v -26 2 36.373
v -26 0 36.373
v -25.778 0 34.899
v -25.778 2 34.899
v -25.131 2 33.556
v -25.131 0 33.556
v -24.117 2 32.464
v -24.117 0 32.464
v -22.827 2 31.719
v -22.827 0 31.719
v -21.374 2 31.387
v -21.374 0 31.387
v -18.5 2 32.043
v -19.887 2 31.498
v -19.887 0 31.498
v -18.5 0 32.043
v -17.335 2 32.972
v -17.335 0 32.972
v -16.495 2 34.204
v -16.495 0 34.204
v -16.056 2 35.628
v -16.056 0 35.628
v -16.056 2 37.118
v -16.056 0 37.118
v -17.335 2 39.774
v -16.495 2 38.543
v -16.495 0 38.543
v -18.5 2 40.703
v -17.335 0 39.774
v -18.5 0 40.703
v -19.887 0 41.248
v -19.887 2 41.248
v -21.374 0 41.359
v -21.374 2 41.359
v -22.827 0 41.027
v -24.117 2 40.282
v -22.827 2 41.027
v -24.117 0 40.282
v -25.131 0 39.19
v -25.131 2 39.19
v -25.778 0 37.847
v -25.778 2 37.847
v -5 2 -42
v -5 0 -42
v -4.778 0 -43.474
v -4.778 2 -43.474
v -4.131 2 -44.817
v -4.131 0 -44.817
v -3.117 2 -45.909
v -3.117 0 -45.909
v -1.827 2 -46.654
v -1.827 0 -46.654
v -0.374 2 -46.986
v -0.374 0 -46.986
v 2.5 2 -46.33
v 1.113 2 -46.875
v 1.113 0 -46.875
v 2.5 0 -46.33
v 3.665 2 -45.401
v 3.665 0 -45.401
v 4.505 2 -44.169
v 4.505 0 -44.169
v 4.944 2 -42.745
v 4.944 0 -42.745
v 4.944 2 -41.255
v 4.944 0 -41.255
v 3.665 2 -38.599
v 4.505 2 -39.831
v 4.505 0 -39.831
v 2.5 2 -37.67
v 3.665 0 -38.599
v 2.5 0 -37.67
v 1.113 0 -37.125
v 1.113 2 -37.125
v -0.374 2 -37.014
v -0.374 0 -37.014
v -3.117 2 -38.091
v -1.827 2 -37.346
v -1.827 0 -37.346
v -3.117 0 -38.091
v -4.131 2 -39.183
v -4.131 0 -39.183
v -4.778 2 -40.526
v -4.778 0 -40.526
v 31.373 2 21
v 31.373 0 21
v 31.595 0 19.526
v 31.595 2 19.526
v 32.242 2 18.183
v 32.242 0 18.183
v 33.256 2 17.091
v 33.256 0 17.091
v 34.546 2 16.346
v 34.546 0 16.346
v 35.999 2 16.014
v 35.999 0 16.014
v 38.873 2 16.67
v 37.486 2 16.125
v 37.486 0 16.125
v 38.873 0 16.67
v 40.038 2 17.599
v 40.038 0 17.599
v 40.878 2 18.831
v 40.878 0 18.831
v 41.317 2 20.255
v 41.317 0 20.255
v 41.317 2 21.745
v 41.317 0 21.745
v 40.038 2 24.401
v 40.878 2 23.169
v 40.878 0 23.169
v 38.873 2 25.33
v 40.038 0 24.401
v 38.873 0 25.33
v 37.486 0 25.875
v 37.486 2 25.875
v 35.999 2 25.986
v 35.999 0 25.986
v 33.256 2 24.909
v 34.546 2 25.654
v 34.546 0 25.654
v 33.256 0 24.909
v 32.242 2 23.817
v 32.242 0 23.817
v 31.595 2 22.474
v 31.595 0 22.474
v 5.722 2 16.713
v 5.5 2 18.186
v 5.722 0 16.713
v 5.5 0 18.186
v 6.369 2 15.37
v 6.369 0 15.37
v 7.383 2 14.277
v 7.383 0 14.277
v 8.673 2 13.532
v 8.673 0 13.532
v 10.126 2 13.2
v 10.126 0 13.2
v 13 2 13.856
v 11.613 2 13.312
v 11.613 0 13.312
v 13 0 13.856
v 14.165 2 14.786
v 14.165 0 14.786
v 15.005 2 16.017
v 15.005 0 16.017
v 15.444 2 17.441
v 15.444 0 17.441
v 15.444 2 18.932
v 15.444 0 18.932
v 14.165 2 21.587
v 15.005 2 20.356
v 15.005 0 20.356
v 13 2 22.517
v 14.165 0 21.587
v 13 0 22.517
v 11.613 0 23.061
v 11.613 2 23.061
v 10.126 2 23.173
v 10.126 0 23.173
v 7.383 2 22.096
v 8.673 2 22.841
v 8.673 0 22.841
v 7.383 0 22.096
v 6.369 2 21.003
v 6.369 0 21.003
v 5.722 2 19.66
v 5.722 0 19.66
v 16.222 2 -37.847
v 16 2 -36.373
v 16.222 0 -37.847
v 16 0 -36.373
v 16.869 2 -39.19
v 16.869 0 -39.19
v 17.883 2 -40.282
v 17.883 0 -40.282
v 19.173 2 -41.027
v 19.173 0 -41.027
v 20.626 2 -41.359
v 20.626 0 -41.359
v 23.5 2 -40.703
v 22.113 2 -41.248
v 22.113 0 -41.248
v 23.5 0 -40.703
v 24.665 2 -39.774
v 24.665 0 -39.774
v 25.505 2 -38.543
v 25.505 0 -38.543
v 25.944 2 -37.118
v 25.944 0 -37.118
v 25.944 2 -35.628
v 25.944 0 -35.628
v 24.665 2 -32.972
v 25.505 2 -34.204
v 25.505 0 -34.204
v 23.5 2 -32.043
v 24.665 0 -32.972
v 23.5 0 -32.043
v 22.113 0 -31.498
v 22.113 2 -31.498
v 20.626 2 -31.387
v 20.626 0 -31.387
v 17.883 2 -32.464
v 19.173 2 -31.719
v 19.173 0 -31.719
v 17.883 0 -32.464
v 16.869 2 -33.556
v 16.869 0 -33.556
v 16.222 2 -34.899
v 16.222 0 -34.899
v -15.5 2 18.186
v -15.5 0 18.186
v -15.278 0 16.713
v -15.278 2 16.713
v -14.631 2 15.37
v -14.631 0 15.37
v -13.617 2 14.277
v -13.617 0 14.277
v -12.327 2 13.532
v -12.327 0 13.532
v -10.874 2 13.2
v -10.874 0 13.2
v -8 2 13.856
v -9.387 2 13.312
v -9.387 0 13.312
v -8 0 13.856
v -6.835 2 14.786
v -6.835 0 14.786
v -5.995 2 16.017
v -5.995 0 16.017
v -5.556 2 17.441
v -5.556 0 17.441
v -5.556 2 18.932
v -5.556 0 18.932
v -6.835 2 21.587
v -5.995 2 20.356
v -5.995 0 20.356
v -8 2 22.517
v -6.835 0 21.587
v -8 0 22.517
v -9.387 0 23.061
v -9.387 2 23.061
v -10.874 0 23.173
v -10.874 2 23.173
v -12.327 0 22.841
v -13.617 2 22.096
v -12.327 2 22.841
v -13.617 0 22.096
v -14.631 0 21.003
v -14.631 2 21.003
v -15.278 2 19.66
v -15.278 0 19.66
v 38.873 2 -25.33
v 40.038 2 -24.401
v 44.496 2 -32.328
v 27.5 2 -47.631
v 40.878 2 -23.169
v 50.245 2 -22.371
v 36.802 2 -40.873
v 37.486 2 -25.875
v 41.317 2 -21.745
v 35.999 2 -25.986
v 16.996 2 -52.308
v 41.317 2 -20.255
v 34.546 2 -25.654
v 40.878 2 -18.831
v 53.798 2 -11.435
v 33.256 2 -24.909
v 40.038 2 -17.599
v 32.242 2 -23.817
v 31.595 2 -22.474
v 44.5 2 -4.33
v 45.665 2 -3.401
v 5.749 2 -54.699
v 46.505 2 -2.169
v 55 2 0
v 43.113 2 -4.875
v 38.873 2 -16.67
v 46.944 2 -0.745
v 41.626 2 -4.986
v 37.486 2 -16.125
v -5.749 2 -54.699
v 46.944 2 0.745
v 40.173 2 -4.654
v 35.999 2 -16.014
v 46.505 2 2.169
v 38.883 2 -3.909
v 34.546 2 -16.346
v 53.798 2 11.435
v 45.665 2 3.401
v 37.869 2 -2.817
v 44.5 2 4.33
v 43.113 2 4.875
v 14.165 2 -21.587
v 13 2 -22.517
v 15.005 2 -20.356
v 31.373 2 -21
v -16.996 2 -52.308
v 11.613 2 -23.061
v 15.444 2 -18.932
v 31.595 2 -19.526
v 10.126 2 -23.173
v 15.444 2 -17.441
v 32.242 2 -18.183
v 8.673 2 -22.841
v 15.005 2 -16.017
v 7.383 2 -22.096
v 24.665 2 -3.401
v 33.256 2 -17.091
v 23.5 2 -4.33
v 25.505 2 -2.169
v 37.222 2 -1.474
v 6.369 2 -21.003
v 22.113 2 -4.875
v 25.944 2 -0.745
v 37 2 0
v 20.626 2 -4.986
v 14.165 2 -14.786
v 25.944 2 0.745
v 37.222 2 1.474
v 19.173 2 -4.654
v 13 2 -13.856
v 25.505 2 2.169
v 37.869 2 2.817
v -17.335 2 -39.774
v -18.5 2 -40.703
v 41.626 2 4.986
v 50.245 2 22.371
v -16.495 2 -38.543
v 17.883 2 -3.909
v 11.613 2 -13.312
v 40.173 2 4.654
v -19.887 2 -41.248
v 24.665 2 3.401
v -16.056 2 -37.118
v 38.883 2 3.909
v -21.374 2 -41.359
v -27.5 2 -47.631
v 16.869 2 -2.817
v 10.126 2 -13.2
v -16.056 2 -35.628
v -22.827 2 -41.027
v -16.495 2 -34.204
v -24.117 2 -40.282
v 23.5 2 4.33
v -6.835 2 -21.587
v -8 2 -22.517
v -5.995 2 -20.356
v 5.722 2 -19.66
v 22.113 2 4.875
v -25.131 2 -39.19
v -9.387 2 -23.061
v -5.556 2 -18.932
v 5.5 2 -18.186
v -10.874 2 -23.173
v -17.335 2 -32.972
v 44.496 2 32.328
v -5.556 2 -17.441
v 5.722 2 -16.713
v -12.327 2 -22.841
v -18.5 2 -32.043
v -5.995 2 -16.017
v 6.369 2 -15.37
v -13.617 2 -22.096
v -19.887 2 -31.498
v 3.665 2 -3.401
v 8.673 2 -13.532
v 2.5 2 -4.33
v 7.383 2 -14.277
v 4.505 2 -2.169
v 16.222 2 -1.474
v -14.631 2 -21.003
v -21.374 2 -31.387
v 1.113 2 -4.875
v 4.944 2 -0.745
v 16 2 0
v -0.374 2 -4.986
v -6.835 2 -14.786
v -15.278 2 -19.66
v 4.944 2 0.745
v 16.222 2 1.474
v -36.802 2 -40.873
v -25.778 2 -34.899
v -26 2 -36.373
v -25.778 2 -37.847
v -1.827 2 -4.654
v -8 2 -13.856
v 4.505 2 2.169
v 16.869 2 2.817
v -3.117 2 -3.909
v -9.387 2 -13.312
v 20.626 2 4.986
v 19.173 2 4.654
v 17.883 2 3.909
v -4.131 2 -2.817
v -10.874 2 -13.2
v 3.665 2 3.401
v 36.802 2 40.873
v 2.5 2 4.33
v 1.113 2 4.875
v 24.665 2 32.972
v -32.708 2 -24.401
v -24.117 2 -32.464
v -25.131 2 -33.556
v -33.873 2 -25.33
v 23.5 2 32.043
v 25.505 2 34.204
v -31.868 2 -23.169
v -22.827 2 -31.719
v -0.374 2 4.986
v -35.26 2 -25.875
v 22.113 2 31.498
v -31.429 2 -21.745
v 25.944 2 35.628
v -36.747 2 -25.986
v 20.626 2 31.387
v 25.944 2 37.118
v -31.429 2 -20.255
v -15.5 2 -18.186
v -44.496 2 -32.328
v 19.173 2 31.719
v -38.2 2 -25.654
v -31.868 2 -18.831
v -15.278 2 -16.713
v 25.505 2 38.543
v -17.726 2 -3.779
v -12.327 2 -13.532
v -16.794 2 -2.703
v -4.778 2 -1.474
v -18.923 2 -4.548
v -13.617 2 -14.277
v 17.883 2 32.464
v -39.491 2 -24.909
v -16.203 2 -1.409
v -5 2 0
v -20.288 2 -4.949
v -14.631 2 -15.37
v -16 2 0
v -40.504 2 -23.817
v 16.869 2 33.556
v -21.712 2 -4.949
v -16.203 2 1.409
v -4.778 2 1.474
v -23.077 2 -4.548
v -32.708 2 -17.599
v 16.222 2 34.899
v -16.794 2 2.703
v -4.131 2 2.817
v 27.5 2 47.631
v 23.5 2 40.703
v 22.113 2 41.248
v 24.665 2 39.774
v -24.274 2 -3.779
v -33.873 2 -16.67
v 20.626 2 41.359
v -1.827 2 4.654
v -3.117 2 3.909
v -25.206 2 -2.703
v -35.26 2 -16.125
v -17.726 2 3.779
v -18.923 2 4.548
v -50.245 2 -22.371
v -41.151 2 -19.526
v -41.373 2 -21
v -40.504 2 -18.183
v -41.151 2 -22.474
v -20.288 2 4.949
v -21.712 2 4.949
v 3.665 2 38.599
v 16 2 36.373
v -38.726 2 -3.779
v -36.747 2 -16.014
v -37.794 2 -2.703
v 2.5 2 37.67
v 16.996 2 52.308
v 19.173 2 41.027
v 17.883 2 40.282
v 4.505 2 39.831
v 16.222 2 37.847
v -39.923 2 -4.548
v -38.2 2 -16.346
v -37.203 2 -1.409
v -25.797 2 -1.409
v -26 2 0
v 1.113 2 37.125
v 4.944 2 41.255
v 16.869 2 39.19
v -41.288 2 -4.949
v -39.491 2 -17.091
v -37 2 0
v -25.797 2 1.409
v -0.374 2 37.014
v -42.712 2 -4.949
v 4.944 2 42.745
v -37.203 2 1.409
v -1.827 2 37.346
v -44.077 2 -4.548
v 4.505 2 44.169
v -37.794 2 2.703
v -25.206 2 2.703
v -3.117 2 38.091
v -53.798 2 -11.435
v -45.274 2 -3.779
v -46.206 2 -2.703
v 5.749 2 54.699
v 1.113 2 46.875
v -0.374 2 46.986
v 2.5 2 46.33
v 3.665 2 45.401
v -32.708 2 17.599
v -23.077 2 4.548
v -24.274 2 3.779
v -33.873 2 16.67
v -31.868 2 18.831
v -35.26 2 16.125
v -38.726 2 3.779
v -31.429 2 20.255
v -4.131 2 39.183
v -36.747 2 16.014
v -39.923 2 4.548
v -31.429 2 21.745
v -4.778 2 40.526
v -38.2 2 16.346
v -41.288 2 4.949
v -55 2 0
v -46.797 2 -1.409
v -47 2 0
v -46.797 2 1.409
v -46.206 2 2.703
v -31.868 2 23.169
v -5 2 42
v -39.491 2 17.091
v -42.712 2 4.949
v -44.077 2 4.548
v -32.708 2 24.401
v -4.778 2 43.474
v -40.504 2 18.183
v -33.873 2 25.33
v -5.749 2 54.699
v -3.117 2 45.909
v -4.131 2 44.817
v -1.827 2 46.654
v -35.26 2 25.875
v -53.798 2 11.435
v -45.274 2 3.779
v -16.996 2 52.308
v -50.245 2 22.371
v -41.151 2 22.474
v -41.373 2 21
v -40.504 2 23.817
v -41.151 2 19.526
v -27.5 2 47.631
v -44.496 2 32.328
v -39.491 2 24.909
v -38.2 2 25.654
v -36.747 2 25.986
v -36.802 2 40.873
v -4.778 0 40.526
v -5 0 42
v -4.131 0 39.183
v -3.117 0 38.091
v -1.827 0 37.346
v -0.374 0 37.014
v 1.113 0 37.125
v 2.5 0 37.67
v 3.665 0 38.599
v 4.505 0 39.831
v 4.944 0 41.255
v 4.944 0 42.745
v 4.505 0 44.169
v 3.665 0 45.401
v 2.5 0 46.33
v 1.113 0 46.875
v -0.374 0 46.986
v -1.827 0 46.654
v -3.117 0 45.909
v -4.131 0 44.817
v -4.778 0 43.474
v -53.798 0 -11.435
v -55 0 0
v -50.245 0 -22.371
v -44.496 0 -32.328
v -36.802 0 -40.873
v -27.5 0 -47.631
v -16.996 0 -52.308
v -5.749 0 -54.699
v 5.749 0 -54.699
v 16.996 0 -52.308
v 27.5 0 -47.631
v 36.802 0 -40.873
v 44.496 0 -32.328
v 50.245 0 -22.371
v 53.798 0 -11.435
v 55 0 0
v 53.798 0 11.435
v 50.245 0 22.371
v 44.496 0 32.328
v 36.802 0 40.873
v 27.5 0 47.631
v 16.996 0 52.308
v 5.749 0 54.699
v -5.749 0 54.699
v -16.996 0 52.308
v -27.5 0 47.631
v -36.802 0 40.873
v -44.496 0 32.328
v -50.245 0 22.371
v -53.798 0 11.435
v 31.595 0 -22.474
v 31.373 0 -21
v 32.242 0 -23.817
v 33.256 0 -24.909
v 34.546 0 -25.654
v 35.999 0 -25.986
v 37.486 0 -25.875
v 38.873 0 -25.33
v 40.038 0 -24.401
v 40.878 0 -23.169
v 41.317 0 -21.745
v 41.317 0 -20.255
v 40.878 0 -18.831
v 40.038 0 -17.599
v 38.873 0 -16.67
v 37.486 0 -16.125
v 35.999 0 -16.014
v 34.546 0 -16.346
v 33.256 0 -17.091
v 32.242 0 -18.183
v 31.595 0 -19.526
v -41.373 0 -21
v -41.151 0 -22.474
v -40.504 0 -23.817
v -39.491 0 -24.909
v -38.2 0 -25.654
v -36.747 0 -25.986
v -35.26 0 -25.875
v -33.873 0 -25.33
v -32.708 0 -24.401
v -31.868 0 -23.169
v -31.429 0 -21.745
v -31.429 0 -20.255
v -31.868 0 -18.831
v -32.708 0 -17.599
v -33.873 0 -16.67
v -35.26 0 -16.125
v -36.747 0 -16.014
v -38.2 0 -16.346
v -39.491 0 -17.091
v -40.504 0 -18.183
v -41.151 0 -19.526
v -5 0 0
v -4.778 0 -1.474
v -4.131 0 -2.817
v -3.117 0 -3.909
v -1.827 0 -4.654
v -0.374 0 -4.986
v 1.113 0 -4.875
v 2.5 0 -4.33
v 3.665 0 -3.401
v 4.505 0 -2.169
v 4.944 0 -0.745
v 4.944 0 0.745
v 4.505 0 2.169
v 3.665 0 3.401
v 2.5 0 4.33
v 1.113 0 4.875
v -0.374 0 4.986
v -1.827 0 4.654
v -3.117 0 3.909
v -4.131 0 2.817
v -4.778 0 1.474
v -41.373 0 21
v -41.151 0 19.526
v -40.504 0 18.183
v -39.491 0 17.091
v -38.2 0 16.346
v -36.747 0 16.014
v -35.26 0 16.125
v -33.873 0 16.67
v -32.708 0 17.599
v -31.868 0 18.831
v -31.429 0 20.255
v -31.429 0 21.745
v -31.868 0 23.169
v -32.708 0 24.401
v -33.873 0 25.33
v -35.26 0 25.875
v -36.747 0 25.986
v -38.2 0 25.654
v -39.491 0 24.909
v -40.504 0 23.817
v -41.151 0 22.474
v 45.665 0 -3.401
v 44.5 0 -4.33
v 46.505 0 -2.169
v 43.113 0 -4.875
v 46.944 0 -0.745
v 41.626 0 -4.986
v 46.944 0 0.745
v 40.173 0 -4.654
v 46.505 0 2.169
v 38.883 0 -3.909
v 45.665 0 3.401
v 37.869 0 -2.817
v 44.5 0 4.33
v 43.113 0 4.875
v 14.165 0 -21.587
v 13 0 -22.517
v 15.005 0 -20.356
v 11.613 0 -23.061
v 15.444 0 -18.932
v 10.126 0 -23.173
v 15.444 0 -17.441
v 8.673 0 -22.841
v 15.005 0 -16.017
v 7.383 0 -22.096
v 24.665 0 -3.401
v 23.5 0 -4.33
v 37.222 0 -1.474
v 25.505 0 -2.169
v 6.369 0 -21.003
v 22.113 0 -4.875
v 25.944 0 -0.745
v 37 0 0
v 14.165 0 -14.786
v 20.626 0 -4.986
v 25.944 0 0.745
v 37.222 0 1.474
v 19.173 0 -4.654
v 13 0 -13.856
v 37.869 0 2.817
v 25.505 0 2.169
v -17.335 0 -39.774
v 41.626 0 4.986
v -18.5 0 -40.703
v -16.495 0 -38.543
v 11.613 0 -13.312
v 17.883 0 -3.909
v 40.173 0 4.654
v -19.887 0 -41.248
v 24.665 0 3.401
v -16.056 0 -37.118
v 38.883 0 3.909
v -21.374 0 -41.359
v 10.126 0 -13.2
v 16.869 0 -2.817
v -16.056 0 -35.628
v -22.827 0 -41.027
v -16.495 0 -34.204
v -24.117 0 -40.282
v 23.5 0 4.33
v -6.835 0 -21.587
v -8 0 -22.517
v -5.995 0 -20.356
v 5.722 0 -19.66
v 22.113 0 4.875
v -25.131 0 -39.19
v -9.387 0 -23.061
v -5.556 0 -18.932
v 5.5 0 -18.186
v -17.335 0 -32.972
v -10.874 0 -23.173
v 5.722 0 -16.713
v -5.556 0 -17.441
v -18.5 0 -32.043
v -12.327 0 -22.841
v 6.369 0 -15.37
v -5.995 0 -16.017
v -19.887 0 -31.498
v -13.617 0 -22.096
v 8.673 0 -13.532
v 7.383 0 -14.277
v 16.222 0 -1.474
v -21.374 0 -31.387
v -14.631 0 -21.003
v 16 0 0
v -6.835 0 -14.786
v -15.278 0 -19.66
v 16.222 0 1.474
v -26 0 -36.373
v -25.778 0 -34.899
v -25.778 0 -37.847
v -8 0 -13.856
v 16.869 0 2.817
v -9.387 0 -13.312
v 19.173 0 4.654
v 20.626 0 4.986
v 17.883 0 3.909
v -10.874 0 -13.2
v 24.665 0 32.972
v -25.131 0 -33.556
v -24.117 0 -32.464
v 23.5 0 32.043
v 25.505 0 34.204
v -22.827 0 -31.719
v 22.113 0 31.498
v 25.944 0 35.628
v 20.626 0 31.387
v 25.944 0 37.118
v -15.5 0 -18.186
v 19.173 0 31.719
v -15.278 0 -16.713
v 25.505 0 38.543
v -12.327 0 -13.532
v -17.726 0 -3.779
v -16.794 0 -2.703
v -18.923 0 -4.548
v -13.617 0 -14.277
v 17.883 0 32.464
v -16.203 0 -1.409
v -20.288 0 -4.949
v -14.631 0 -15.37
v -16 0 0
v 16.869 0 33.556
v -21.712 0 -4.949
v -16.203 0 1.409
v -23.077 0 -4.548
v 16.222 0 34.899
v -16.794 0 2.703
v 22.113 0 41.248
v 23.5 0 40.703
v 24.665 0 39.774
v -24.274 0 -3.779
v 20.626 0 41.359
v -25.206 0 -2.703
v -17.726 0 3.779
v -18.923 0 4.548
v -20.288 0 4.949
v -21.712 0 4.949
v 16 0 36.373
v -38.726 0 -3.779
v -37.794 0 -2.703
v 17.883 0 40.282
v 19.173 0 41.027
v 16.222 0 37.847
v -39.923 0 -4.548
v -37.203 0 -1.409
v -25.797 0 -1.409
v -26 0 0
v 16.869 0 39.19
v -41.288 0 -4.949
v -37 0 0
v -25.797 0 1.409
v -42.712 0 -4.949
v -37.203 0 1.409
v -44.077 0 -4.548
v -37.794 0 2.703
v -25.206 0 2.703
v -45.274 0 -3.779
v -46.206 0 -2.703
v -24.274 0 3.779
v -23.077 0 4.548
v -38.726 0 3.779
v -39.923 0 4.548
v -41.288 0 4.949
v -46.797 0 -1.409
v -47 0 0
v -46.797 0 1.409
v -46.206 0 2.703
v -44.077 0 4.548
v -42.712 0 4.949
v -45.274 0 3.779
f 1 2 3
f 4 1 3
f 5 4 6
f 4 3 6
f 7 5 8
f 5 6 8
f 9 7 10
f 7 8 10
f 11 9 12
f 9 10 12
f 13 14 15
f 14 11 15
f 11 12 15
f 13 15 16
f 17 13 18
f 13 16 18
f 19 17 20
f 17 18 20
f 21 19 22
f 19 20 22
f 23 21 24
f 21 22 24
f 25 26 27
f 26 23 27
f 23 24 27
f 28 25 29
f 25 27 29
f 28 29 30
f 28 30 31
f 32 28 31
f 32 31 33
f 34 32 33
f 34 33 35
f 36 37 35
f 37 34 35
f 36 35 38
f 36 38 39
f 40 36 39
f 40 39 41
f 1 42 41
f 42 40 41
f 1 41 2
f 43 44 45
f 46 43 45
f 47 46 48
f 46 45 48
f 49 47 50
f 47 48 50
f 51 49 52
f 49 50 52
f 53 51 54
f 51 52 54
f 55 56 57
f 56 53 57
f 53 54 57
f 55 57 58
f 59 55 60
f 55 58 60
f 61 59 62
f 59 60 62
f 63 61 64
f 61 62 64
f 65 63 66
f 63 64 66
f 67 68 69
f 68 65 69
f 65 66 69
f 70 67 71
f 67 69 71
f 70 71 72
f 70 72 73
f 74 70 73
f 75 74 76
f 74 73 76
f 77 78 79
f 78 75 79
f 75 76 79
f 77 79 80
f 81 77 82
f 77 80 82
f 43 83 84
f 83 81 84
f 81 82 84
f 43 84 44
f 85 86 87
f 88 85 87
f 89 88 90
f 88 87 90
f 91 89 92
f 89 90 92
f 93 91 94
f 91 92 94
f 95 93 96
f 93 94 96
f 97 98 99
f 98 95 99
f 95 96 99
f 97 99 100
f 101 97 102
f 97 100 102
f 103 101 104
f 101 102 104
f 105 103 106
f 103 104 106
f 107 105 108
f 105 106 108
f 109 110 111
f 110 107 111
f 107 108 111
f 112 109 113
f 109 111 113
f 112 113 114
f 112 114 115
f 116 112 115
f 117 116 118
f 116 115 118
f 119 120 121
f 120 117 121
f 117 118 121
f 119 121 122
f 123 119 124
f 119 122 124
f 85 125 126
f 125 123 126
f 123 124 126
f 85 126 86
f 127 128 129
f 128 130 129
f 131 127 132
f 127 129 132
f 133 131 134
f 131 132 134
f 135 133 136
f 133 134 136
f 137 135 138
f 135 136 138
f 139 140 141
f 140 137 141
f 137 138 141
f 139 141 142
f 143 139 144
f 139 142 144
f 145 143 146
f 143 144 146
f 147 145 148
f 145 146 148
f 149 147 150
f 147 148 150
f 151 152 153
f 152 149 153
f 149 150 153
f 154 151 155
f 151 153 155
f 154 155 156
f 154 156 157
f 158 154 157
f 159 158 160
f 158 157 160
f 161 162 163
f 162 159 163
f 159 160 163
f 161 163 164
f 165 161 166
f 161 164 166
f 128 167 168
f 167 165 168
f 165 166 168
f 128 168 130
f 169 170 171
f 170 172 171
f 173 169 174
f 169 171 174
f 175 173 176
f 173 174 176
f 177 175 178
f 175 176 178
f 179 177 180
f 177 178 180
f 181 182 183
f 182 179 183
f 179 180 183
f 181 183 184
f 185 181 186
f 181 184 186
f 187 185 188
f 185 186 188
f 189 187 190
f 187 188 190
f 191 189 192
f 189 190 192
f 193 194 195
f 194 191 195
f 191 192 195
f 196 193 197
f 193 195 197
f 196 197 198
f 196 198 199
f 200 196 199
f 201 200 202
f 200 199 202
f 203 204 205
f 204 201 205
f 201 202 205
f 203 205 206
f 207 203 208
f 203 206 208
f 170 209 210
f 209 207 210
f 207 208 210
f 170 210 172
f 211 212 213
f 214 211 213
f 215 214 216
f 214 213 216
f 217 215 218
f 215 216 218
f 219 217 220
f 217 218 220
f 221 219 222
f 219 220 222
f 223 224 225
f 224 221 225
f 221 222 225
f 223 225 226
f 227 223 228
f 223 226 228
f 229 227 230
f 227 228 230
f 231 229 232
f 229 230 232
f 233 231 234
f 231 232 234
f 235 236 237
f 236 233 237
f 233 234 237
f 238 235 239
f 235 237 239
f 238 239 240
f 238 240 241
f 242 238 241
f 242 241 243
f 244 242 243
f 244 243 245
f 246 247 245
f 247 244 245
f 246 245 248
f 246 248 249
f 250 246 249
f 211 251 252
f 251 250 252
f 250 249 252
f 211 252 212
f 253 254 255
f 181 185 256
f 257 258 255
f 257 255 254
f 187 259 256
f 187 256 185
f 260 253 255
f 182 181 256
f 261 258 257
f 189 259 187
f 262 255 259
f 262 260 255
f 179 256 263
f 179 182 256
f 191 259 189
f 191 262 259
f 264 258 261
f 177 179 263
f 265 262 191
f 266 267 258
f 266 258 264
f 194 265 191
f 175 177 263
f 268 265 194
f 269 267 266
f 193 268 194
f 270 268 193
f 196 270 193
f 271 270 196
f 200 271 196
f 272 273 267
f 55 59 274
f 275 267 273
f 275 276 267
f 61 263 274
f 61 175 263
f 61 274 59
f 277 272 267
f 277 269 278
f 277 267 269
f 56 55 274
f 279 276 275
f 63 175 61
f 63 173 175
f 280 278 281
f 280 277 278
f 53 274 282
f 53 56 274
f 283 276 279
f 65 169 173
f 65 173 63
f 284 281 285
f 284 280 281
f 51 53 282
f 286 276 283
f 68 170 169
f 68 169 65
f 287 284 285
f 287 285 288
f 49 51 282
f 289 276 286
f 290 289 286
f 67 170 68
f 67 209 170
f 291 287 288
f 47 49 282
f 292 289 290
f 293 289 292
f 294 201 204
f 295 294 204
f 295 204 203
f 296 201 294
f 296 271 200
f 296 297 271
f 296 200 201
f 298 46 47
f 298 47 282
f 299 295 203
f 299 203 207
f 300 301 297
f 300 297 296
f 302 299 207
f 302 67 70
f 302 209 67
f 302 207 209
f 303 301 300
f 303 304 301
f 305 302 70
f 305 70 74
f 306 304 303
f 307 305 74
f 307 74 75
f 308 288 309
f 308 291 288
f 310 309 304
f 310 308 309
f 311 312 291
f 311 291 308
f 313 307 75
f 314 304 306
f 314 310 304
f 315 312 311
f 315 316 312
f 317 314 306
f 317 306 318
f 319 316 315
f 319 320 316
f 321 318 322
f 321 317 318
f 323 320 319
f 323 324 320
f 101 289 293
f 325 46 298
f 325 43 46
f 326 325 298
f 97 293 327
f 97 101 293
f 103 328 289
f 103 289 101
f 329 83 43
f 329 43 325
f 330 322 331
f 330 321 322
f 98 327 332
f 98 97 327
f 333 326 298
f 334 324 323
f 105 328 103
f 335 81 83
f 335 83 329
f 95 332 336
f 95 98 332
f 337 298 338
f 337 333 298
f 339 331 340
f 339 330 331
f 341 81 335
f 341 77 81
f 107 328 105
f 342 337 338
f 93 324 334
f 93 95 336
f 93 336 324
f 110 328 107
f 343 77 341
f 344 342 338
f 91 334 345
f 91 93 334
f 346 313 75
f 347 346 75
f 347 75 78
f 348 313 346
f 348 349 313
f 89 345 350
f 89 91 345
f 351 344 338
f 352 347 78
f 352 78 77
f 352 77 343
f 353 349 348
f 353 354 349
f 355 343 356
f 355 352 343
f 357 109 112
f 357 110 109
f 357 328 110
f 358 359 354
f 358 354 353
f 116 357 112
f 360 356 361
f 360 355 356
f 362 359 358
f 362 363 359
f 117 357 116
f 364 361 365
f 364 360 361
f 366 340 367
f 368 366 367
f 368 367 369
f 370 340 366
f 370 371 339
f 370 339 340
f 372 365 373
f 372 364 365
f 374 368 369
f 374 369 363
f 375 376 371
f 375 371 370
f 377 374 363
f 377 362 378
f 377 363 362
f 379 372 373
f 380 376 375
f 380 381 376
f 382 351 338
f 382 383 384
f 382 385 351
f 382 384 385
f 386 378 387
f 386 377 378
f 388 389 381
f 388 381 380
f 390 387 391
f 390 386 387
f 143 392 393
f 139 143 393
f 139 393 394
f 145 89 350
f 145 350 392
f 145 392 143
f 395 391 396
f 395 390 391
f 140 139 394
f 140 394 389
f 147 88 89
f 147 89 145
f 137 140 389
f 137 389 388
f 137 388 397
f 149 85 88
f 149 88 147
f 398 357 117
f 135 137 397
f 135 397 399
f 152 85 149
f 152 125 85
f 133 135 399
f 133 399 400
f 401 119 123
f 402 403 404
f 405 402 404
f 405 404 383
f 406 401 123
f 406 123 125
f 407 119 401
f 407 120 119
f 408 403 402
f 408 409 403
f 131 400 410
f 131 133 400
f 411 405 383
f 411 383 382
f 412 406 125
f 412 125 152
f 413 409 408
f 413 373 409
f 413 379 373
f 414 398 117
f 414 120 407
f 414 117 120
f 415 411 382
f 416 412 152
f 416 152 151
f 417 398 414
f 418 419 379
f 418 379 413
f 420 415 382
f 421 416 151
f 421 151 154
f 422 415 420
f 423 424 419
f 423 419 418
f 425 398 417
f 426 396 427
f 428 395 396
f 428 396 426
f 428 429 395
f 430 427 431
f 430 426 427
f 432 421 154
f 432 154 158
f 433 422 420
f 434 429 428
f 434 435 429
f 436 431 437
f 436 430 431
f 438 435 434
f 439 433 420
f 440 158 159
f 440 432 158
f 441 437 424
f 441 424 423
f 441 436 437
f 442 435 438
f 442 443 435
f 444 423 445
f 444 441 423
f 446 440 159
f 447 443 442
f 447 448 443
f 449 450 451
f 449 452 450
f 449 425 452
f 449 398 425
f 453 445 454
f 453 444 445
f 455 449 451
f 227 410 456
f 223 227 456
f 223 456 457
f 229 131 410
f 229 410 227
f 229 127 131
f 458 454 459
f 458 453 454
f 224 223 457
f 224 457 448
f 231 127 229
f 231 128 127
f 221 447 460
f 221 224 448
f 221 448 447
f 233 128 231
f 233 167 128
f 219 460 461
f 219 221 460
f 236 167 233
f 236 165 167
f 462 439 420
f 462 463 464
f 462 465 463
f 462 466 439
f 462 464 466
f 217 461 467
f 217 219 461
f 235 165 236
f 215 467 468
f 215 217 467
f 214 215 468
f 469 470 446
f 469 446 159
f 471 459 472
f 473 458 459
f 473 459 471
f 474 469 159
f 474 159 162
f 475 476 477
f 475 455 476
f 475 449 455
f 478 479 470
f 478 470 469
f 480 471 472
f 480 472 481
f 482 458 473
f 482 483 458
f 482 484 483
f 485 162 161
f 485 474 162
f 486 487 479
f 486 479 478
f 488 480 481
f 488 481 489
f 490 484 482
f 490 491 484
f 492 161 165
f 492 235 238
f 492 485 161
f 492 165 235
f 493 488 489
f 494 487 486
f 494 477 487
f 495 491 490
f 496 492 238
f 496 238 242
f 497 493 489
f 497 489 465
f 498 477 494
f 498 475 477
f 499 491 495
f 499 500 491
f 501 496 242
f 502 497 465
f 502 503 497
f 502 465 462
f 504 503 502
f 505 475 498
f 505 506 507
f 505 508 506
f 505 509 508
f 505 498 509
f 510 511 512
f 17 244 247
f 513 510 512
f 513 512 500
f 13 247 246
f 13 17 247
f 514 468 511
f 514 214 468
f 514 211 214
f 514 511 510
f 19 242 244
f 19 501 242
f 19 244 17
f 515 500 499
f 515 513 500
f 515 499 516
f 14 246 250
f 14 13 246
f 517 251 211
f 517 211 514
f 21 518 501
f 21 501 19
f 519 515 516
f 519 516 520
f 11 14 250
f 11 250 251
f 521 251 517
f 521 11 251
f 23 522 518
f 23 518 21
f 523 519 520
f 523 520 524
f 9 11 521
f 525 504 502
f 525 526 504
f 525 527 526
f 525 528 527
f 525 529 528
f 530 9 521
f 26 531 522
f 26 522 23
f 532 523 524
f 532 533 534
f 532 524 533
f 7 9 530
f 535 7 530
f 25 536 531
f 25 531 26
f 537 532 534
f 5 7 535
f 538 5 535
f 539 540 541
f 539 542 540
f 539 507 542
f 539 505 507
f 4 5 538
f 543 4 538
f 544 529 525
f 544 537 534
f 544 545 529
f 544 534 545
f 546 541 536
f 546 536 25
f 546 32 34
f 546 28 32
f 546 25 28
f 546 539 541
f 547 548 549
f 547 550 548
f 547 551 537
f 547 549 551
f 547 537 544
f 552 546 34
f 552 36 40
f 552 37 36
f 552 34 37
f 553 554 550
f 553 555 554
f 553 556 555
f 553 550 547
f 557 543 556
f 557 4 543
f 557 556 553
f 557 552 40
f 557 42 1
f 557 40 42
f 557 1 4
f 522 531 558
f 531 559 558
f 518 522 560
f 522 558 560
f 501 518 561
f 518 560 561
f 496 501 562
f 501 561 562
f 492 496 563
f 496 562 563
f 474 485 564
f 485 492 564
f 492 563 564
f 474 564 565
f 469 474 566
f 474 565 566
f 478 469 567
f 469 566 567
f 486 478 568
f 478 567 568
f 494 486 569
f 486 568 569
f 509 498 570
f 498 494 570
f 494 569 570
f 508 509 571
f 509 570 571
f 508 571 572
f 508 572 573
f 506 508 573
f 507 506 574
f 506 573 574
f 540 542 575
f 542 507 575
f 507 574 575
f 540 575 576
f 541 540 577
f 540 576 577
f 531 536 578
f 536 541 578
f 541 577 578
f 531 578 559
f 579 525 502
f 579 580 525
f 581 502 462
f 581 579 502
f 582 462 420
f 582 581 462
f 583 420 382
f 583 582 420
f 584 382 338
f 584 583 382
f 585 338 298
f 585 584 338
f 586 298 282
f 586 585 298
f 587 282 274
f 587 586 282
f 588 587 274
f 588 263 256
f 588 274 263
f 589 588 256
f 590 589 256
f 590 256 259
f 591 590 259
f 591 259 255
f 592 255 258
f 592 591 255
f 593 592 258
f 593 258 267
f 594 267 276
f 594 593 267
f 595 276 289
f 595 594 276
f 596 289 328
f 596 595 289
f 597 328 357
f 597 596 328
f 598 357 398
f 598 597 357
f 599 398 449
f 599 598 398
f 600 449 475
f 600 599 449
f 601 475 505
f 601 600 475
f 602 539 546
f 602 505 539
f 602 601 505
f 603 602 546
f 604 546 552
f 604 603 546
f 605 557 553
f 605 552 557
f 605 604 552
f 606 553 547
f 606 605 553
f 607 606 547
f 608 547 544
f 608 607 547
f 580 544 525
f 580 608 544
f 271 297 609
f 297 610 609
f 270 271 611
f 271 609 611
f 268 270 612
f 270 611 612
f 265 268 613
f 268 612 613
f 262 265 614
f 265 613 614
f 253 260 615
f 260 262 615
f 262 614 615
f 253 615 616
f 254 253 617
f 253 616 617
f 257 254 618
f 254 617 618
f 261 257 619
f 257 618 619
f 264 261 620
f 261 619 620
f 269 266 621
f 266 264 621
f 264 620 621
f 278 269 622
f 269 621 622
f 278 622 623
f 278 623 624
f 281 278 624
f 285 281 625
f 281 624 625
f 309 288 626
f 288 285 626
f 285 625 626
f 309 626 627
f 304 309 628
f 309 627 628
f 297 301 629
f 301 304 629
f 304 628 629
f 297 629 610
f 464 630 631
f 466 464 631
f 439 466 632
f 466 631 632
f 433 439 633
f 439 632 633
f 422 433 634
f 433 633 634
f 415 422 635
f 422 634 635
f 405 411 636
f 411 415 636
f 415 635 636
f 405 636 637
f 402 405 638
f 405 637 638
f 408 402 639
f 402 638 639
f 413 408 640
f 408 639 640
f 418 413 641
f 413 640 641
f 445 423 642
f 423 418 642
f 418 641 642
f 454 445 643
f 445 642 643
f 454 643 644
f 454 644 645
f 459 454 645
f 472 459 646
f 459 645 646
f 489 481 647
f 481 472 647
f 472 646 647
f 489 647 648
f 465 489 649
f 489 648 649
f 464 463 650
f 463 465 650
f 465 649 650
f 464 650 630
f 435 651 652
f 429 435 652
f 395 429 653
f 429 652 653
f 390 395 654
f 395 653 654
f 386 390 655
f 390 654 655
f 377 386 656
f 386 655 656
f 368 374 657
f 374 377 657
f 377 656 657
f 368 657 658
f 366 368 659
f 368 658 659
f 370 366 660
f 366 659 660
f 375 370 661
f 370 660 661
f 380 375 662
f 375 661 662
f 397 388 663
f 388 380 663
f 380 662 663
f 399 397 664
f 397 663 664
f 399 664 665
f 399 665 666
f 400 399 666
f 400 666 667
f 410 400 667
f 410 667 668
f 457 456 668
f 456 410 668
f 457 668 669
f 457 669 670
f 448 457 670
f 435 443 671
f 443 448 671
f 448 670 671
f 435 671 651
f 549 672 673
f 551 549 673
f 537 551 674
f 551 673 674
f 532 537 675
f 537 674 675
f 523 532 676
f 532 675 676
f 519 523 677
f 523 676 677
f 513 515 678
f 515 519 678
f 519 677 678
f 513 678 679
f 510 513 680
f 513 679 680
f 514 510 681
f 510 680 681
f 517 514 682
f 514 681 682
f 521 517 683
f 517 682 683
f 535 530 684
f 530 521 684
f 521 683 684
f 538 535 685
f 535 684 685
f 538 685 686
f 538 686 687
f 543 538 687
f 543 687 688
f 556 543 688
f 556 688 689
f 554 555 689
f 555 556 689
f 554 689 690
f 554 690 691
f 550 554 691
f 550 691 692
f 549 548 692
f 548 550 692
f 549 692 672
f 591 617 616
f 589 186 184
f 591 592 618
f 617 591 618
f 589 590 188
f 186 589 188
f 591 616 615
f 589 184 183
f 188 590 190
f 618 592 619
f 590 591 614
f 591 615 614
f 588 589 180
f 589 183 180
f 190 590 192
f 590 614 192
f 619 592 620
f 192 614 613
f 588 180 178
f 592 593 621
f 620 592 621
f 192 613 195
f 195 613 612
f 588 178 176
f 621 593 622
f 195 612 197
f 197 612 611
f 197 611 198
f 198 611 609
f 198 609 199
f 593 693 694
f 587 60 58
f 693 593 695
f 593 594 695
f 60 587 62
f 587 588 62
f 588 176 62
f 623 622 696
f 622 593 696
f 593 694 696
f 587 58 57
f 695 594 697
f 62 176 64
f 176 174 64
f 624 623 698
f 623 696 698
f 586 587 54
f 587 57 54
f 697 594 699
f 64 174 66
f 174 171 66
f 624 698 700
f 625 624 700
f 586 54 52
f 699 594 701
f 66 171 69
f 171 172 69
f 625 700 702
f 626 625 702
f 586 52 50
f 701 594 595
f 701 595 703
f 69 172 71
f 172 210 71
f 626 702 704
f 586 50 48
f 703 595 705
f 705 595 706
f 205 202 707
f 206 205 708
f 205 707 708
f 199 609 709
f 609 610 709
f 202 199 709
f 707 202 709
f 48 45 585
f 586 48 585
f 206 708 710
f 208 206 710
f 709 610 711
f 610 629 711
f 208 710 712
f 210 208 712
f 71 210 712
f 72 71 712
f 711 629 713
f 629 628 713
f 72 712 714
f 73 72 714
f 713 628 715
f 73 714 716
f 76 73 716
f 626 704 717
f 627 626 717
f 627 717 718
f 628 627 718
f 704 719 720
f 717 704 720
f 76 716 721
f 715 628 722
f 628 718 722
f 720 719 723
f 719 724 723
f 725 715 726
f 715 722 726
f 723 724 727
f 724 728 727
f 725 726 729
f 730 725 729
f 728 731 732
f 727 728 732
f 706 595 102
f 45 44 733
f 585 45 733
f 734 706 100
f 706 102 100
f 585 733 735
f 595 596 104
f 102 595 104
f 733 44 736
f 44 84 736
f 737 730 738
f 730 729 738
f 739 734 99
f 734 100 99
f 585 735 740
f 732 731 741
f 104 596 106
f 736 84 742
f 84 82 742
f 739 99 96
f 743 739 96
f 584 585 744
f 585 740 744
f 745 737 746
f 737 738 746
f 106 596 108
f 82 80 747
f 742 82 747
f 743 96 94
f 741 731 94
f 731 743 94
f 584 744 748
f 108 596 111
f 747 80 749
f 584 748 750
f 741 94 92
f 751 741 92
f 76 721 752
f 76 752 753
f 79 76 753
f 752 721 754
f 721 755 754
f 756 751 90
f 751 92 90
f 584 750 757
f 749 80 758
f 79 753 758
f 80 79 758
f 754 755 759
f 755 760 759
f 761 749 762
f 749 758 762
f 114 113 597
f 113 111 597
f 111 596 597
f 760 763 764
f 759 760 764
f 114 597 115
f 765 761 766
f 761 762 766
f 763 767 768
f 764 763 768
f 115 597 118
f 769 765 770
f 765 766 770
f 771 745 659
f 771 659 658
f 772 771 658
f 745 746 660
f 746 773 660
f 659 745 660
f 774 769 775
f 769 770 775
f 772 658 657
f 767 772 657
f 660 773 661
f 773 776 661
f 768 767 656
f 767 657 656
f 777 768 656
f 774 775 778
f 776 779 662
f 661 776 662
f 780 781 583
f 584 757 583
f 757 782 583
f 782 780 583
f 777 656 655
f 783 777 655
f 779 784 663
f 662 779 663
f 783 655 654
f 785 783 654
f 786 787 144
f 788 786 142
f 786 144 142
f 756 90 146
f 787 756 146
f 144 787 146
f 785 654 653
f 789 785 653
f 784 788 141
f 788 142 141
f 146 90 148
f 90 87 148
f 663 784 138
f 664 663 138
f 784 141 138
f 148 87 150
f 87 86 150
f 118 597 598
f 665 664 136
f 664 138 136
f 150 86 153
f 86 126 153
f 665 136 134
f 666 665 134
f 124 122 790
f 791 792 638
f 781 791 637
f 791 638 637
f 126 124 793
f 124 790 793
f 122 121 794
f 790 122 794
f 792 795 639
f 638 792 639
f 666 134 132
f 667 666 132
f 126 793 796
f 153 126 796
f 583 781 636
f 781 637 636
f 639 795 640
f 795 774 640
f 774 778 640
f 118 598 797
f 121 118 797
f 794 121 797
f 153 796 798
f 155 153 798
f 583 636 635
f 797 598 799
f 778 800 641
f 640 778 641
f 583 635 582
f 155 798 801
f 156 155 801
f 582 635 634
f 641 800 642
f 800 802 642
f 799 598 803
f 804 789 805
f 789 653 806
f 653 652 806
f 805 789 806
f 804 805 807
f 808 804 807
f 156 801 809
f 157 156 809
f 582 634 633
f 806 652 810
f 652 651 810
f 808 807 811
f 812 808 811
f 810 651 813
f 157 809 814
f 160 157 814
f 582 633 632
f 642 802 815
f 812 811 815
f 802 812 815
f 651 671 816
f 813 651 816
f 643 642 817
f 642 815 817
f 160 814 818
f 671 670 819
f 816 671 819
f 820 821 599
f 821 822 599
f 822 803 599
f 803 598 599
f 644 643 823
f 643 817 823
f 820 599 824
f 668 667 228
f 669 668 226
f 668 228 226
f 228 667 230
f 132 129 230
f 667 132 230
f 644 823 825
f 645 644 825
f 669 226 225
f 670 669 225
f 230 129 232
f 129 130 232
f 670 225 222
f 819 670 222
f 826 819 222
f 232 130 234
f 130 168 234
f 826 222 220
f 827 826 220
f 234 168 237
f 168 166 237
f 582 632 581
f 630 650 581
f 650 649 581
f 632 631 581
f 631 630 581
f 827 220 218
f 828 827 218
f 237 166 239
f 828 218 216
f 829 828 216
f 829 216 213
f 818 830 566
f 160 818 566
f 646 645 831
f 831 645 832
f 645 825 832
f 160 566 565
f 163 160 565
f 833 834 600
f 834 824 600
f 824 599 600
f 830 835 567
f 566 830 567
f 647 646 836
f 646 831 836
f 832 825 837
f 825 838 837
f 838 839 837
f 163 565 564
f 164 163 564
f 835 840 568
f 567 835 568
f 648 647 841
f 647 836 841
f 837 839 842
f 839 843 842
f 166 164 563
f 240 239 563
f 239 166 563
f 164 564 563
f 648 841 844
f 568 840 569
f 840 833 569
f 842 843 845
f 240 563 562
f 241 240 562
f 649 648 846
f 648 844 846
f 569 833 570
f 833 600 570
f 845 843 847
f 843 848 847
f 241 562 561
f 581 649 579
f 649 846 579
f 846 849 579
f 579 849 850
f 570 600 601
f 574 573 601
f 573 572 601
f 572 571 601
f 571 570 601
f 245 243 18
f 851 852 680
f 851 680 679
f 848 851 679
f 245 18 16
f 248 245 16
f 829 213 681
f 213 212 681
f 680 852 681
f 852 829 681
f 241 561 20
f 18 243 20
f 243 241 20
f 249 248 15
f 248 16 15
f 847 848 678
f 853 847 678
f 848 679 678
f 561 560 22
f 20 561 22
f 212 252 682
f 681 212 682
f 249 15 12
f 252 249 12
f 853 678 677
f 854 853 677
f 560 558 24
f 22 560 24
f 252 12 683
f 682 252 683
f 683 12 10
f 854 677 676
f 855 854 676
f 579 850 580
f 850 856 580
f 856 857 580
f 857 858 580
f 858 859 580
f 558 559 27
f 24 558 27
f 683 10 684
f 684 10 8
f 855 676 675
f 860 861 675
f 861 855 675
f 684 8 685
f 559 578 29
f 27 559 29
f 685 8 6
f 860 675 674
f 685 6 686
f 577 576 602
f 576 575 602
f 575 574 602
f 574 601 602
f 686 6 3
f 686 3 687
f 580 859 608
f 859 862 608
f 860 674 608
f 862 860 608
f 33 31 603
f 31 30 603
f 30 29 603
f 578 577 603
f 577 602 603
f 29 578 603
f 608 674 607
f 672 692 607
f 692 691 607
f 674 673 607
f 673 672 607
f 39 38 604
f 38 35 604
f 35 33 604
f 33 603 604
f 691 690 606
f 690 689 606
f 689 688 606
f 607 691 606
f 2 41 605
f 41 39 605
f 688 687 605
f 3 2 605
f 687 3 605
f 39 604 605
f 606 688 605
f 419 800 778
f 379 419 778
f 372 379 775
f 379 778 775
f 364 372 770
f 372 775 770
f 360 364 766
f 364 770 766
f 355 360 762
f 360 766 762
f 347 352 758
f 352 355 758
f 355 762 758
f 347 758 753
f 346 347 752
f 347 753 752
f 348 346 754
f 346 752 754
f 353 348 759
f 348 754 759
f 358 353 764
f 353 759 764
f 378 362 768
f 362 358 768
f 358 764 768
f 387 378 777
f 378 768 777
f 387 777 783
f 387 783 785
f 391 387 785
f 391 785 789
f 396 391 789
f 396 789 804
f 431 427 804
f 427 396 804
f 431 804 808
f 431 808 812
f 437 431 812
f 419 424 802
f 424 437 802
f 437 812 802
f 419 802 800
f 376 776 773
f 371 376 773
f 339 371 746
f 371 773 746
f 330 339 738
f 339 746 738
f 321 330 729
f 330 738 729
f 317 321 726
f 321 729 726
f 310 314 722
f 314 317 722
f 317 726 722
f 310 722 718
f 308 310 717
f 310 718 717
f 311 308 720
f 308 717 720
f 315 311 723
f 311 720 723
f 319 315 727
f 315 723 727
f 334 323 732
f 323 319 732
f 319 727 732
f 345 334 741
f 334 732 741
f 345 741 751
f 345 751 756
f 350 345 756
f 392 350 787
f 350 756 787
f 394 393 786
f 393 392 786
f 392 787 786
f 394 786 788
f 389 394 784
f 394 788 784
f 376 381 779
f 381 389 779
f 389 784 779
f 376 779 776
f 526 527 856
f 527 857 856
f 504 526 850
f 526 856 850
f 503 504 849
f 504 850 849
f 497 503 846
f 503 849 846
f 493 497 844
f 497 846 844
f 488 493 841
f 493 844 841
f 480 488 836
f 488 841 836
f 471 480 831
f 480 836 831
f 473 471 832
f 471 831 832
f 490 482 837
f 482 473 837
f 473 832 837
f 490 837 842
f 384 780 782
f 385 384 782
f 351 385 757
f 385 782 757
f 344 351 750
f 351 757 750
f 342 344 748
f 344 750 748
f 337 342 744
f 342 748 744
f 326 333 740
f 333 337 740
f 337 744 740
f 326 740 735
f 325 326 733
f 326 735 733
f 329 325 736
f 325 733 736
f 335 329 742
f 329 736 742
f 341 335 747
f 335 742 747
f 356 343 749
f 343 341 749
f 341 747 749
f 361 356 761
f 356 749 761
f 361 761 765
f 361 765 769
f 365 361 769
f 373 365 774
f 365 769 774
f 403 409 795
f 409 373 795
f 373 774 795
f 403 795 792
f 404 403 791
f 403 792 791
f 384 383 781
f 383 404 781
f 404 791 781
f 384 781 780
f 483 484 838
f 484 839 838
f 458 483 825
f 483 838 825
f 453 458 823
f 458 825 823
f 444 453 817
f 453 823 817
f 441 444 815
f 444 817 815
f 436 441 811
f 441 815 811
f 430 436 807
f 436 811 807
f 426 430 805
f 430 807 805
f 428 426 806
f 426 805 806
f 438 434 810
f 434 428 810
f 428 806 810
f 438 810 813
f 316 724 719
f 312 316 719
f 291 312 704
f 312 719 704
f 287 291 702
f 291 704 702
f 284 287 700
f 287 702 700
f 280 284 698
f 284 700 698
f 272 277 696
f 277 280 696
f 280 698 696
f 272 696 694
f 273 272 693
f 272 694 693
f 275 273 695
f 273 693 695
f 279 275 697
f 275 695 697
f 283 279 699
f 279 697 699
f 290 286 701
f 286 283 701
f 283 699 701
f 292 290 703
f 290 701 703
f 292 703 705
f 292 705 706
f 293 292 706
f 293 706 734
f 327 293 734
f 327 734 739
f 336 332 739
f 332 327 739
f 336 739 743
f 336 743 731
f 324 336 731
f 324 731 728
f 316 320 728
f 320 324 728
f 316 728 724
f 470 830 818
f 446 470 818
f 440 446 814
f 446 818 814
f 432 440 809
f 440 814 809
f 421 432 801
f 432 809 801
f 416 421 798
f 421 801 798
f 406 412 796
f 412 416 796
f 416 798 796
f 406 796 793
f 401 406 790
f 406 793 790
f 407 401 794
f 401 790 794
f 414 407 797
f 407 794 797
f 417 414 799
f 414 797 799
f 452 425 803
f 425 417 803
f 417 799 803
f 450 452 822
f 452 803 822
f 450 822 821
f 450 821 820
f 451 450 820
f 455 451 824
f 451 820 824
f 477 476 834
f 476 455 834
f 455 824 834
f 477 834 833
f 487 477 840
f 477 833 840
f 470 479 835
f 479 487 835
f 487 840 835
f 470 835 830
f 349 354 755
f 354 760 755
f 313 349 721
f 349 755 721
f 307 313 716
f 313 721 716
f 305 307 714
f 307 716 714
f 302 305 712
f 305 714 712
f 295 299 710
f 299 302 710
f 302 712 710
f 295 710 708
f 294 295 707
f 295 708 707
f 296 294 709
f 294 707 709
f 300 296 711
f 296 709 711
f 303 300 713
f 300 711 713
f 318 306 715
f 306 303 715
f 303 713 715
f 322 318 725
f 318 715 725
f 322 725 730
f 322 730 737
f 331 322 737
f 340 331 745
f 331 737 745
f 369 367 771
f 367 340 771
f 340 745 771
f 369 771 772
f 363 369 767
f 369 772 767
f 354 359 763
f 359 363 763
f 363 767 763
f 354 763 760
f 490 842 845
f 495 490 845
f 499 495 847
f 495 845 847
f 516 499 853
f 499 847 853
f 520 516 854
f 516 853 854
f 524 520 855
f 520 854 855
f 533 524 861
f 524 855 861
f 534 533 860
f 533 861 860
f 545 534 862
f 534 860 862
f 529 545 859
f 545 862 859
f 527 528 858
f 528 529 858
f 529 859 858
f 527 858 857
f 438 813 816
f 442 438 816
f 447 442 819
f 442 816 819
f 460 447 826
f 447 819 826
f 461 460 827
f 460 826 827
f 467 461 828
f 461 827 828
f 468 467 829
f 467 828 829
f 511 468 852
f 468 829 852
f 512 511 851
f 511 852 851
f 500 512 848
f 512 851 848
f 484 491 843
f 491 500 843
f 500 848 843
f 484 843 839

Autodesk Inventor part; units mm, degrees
ref_plane "YZ Plane" through (0, 0, 0) normal (1, 0, 0) x (0, 1, 0)
ref_plane "XZ Plane" through (0, 0, 0) normal (0, 1, 0) x (-1, 0, 0)
ref_plane "XY Plane" through (0, 0, 0) normal (0, 0, 1) x (1, 0, 0)
sketch "Sketch1" plane through (0, 0, 0) normal (0, 1, 0) x (-1, 0, 0)
  circle A0 centre (0, 0) radius 55
  line L0 (0, 0) -> (15, 0)
  circle A1 centre (0, 0) radius 8 construction
  line L1 (0, 0) -> (21, 0)
  circle A2 centre (21, 0) radius 8 construction
  line L2 (0, 0) -> (42, 0)
  circle A3 centre (42, 0) radius 8 construction
  circle A4 centre (0, 0) radius 5
  circle A5 centre (21, 0) radius 5
  circle A6 centre (10.5, 18.1865) radius 5
  circle A7 centre (-10.5, 18.1865) radius 5
  circle A8 centre (-21, 0) radius 5
  circle A9 centre (-10.5, -18.1865) radius 5
  circle A10 centre (10.5, -18.1865) radius 5
  circle A11 centre (42, 0) radius 5
  circle A12 centre (36.3731, 21) radius 5
  circle A13 centre (21, 36.3731) radius 5
  circle A14 centre (0, 42) radius 5
  circle A15 centre (-21, 36.3731) radius 5
  circle A16 centre (-36.3731, 21) radius 5
  circle A17 centre (-42, 0) radius 5
  circle A18 centre (-36.3731, -21) radius 5
  circle A19 centre (-21, -36.3731) radius 5
  circle A20 centre (0, -42) radius 5
  circle A21 centre (21, -36.3731) radius 5
  circle A22 centre (36.3731, -21) radius 5
  dimension "d0" = 110
  dimension "d4" = 15
  dimension "d6" = 16
  dimension "d7" = 21
  dimension "d8" = 16
  dimension "d14" = 42
  dimension "d15" = 16
  dimension "d20" = 10
  dimension "d21" = 10
  dimension "d24" = 360
  dimension "d26" = 10
  dimension "d29" = 360
extrude "Extrusion1" add sketch "Sketch1" along normal blind 2
properties part number "separator_v2" material "Brass, Soft Yellow, Welded"
